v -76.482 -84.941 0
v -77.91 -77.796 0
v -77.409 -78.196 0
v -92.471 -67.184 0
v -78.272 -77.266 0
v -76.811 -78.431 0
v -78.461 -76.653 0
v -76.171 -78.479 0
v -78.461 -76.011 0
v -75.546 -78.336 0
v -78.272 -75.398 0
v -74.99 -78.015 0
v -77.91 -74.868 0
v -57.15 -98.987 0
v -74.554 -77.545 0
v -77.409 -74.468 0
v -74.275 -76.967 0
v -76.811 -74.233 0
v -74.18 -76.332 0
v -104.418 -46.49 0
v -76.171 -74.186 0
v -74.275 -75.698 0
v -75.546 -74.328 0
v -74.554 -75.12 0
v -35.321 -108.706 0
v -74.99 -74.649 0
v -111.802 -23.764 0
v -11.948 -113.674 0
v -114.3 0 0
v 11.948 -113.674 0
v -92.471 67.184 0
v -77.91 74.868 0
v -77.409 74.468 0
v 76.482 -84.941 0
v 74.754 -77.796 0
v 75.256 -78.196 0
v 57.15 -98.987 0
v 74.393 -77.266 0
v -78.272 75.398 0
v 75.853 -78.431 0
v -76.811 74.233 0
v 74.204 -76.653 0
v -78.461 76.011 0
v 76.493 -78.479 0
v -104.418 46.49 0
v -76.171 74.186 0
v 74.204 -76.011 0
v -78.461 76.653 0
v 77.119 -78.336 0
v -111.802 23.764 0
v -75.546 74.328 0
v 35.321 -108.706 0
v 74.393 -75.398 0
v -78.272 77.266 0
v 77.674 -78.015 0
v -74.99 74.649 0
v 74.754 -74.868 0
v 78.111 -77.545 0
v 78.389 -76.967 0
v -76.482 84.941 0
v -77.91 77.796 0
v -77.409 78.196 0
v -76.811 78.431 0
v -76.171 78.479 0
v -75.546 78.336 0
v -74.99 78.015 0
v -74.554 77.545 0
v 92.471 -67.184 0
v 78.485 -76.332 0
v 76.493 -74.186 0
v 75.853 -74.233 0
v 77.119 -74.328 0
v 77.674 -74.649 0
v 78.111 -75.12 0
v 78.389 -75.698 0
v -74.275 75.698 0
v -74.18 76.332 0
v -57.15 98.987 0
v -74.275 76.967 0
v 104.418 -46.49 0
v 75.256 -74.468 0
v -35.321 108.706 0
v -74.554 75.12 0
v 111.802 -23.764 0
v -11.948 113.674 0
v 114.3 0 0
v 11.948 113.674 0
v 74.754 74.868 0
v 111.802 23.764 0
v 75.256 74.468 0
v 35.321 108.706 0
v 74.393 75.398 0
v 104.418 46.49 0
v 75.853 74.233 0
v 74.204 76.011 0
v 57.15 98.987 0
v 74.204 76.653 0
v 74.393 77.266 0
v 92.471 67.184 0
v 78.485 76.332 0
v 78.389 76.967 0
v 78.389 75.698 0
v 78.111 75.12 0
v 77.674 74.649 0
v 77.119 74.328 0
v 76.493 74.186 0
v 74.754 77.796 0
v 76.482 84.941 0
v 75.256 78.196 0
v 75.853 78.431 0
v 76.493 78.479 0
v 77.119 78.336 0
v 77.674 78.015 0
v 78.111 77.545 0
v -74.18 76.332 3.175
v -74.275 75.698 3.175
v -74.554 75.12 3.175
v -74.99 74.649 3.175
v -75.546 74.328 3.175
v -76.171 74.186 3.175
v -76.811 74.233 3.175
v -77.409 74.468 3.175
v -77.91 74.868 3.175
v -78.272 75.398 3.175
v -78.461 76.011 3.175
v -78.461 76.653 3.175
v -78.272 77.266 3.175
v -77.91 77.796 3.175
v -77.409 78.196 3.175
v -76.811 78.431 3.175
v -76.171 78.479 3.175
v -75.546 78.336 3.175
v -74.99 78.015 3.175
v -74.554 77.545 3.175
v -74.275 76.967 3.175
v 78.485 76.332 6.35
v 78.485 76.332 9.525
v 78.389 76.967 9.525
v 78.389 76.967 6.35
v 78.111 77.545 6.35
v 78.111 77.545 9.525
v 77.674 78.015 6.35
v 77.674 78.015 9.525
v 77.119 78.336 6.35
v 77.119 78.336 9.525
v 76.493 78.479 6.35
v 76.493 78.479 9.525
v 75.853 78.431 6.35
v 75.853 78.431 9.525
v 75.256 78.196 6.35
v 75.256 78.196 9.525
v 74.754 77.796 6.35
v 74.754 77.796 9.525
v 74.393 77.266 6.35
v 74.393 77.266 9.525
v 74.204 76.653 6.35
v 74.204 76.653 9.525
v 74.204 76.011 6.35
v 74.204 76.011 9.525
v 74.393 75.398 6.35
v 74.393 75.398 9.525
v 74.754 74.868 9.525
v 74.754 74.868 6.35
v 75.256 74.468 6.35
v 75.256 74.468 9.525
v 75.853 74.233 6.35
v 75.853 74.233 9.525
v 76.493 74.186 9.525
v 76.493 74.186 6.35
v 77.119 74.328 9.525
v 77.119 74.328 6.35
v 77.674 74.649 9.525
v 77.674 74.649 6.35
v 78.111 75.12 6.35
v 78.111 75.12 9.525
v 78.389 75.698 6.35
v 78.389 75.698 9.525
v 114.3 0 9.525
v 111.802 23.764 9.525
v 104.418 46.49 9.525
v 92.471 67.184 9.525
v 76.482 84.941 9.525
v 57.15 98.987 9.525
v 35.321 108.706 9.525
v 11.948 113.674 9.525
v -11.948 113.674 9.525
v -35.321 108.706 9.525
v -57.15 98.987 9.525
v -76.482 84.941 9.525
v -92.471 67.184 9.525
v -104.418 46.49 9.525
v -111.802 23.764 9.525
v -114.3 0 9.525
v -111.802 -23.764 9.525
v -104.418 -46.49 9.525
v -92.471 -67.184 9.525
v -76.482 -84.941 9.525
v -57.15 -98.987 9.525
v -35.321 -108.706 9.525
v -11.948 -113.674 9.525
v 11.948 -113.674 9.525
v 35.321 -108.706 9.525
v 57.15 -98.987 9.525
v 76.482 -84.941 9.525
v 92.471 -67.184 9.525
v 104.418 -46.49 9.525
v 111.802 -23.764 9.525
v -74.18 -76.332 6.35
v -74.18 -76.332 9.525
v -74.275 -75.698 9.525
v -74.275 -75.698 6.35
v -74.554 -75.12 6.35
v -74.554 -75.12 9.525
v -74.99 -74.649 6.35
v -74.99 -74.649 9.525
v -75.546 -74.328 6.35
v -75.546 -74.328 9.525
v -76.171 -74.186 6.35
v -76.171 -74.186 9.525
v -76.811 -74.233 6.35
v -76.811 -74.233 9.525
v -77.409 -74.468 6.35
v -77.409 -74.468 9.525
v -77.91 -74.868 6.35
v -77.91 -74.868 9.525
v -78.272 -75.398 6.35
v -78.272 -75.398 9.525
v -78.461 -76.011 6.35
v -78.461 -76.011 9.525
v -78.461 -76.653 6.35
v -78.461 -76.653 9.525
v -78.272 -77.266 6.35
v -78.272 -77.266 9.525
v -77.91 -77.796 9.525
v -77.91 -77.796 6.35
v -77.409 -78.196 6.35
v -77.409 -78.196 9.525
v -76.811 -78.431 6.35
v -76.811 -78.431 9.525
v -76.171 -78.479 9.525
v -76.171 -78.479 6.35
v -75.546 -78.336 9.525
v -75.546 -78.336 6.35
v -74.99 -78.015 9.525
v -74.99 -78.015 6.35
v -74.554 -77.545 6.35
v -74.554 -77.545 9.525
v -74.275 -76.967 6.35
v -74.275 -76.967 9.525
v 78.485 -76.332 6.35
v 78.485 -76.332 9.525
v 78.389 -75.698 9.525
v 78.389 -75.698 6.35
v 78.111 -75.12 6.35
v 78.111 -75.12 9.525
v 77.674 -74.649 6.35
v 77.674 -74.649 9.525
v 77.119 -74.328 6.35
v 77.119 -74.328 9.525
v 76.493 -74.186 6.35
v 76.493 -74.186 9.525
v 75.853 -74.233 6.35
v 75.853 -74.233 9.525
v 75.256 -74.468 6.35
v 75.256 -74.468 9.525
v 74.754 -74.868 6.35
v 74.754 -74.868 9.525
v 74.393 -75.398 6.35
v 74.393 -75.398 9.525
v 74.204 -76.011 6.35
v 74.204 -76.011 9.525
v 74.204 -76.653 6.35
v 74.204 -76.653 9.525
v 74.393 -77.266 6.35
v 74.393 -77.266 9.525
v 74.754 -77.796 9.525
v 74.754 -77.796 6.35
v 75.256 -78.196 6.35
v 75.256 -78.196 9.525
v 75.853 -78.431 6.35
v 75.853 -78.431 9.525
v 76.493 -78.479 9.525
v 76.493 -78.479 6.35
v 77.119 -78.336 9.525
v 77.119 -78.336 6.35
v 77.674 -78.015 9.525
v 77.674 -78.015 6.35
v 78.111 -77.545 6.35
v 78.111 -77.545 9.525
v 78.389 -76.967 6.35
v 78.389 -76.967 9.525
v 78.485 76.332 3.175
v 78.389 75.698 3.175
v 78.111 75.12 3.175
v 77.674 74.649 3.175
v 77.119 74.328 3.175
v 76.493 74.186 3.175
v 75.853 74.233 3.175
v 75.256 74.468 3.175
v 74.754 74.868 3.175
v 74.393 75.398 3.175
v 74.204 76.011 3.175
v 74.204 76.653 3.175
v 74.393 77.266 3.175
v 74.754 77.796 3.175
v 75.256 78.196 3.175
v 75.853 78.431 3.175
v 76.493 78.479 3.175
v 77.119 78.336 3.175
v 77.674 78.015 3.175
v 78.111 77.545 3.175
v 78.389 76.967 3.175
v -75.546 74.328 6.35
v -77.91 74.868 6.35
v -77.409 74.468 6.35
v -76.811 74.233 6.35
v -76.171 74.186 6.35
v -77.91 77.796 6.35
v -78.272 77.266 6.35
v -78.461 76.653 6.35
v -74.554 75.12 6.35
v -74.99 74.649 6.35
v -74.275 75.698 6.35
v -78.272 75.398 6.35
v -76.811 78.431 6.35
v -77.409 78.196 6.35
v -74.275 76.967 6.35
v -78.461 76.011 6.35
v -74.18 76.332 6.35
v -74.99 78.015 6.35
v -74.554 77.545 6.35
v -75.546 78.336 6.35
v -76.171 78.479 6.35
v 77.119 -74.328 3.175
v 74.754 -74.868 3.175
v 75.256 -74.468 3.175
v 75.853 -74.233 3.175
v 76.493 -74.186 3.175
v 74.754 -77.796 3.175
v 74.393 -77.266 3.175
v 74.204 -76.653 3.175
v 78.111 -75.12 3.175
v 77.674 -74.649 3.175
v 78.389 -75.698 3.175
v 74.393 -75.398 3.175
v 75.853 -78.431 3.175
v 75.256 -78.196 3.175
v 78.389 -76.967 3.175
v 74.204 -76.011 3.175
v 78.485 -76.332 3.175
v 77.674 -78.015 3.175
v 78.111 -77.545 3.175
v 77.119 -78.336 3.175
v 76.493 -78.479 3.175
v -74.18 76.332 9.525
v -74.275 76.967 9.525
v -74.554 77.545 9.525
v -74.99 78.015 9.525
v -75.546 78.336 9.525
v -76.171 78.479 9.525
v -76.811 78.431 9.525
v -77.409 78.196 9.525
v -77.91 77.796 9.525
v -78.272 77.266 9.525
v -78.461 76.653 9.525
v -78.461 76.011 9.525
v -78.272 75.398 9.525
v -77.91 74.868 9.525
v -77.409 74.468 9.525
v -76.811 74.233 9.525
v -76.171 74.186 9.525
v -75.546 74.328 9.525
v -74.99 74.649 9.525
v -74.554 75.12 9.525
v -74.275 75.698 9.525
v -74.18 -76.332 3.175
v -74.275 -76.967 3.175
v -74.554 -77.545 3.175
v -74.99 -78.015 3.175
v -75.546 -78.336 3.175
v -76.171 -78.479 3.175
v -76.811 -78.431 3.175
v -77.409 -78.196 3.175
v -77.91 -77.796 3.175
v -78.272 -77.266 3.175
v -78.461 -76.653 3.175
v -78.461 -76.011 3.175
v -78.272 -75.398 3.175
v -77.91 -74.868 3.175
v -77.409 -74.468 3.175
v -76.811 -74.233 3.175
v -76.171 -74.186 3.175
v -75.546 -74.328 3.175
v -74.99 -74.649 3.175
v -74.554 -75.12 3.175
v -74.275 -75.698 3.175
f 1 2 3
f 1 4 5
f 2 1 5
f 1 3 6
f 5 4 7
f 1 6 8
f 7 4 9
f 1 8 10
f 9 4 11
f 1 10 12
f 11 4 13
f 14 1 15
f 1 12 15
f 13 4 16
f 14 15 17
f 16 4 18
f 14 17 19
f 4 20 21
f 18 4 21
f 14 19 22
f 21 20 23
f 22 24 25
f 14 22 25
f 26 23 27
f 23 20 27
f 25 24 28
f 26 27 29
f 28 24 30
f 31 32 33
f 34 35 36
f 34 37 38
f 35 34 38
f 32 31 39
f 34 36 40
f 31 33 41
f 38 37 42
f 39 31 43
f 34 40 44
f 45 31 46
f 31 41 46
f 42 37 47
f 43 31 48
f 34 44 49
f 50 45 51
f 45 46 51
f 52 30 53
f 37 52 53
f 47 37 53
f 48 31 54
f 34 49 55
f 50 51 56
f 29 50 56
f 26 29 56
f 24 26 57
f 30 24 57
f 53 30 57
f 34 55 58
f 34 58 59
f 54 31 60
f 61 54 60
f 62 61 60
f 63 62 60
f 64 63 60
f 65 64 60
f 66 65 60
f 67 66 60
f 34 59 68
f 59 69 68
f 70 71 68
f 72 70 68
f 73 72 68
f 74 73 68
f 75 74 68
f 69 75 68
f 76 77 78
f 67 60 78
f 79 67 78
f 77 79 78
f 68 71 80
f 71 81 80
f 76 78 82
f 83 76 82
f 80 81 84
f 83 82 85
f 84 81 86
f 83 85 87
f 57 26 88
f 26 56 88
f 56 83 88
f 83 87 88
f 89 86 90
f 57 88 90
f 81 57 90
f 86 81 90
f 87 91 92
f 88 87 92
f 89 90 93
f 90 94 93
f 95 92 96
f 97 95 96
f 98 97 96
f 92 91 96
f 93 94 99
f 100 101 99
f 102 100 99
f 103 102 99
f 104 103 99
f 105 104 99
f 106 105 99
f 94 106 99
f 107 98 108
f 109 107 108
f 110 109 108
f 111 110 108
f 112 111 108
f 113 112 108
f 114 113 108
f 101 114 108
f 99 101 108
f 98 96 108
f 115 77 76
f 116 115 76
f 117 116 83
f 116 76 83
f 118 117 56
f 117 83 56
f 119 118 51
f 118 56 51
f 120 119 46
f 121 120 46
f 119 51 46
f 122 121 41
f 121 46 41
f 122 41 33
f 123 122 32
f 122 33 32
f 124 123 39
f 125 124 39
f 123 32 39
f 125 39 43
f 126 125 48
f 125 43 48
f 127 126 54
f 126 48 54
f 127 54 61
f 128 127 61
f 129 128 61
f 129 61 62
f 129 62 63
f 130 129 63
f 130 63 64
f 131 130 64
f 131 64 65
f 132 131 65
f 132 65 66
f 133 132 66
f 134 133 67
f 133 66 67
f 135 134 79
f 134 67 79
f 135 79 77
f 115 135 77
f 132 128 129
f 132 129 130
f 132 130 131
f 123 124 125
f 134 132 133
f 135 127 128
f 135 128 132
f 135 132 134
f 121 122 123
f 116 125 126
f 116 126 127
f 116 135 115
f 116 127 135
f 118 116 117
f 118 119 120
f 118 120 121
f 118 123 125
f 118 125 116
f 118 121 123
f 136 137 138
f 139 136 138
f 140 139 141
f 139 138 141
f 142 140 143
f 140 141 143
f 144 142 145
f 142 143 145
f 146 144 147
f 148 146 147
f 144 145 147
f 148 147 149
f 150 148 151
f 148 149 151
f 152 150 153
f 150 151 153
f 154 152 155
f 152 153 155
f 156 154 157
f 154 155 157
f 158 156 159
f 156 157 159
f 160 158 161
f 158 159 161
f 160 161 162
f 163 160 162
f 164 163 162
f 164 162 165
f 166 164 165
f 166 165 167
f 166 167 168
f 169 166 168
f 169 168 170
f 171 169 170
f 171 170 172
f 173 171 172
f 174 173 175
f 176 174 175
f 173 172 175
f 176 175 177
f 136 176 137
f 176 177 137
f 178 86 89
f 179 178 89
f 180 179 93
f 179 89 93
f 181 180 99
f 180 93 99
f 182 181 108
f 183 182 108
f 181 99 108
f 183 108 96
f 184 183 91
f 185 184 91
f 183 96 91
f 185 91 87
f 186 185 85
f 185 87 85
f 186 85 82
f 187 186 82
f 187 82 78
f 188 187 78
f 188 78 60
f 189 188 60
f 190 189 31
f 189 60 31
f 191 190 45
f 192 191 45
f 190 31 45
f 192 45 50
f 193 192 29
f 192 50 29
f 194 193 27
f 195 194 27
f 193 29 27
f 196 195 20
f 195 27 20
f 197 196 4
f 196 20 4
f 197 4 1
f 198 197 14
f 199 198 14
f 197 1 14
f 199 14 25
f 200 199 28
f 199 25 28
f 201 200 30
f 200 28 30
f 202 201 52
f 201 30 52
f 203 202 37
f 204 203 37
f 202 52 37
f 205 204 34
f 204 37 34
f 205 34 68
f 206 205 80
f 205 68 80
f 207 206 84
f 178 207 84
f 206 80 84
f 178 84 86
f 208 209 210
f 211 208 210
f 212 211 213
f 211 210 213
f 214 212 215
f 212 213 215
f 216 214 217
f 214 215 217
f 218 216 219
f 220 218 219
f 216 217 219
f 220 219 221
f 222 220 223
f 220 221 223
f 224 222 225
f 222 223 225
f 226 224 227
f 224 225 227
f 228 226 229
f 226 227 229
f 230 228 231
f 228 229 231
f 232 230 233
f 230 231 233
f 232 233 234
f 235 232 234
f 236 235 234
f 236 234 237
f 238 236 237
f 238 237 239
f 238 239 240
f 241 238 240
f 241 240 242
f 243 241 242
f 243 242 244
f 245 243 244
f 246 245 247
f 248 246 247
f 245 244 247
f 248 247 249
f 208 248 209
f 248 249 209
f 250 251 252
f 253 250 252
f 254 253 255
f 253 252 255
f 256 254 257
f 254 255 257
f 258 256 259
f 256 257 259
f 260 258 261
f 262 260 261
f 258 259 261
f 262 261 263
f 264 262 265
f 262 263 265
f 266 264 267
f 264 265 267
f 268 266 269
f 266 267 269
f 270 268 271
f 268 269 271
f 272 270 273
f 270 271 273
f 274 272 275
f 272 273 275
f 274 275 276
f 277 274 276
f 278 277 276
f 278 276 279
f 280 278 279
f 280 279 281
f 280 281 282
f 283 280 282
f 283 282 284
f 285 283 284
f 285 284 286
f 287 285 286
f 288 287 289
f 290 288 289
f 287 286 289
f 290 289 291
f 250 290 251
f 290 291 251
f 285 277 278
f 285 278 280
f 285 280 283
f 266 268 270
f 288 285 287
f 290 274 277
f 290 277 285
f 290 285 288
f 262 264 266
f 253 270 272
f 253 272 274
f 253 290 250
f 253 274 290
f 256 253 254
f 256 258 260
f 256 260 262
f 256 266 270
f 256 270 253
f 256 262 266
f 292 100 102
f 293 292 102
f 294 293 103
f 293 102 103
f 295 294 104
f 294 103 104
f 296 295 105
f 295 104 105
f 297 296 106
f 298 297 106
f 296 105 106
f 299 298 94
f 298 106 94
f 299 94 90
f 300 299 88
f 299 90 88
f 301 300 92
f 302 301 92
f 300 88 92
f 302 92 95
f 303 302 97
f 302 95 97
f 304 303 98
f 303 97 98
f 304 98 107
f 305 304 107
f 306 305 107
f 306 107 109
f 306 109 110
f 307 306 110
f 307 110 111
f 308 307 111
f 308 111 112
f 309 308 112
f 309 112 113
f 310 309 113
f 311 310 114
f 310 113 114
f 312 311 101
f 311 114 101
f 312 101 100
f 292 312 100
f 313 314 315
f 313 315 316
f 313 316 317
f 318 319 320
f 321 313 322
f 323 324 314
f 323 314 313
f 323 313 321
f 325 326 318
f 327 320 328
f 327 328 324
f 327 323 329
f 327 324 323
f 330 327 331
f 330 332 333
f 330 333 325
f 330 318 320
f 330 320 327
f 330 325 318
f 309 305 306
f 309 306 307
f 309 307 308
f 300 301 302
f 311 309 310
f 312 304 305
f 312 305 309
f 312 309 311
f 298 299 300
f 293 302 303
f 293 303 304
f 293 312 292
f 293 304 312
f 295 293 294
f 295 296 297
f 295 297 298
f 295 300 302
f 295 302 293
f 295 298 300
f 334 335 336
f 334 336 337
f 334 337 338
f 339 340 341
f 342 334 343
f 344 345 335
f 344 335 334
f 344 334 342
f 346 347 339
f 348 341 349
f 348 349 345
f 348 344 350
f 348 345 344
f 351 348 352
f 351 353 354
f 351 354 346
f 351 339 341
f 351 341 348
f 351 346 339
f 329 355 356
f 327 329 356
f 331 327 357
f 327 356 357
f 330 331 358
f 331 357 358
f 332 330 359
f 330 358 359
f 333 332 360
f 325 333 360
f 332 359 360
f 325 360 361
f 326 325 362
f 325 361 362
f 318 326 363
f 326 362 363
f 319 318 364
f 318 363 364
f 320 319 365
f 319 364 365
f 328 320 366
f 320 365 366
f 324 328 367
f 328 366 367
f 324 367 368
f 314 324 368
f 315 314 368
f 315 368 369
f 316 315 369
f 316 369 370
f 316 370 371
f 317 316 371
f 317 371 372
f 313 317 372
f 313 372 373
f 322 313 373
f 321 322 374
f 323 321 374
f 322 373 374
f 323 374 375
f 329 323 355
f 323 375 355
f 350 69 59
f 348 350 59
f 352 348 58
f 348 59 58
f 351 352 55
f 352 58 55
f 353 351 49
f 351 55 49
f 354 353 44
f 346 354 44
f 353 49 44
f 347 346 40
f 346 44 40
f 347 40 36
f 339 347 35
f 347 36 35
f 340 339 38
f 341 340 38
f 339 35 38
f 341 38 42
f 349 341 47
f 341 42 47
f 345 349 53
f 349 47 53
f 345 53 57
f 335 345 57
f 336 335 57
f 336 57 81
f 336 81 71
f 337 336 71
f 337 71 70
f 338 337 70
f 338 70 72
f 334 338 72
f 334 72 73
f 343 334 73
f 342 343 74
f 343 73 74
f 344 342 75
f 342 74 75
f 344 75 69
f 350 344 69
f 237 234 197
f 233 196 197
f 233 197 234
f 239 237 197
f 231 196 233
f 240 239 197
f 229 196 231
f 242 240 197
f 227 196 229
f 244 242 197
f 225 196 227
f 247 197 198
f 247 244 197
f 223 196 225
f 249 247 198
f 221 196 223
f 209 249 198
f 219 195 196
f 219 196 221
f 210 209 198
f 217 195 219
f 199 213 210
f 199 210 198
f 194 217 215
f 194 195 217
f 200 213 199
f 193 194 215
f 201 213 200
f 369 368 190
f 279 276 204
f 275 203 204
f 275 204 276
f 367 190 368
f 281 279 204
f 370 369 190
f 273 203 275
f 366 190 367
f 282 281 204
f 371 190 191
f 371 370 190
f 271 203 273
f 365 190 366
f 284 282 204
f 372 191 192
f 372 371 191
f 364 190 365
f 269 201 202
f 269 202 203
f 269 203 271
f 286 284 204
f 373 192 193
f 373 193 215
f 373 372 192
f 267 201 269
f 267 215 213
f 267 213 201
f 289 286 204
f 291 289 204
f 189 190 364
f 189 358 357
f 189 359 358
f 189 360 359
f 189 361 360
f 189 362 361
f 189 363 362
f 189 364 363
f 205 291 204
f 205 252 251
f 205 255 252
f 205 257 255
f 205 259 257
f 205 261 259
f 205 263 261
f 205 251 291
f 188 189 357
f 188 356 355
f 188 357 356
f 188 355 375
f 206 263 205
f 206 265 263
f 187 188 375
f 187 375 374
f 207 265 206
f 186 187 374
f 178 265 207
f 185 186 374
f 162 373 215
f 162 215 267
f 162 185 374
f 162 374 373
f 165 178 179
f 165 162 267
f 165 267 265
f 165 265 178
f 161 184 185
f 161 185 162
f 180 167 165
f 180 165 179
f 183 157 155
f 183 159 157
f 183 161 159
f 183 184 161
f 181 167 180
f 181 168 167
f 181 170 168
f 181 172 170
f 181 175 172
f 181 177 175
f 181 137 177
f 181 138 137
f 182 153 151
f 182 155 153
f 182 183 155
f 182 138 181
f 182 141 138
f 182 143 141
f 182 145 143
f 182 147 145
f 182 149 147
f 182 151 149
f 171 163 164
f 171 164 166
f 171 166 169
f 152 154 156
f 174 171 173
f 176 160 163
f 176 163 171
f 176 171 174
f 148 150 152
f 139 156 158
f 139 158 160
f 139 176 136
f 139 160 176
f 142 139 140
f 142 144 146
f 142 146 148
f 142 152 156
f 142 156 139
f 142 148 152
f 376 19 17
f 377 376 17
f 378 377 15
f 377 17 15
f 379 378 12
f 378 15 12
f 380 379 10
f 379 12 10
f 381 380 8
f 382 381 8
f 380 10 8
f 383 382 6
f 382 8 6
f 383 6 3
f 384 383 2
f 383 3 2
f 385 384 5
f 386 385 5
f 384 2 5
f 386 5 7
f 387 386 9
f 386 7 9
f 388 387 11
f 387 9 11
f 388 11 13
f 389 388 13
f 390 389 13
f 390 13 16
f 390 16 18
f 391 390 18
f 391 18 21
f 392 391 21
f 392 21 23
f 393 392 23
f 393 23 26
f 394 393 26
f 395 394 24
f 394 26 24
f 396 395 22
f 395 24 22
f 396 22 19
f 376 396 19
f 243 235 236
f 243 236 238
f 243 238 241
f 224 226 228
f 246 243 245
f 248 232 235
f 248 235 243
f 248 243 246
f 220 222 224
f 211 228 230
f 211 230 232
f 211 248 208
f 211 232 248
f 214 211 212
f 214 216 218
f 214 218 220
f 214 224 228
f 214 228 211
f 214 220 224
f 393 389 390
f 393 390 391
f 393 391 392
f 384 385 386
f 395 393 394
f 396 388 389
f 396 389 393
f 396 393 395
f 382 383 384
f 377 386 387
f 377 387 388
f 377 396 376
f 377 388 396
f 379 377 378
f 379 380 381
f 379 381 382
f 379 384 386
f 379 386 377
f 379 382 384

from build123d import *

# Parameters (mm, degrees)
F0_R     = 114.3
F1_DEPTH = 9.525
F2_R     = 2.15265
F3_DEPTH = 3.175
F4_R     = 2.15265
F5_DEPTH = 3.175


with BuildPart() as f1:
    # F0 (on Top) → F1 (new body)
    with BuildSketch(Plane.XY):
        Circle(F0_R)
    extrude(amount=F1_DEPTH)

    # F2 (on face) → F3 (cut)
    with BuildSketch(Plane.XY.offset(9.525)):
        with Locations((-76.332177, 76.332177)):
            Circle(F2_R)
        with Locations((76.332177, 76.332177)):
            Circle(F2_R)
        with Locations((76.332177, -76.332177)):
            Circle(F2_R)
        with Locations((-76.332177, -76.332177)):
            Circle(F2_R)
    extrude(amount=-F3_DEPTH, mode=Mode.SUBTRACT)

    # F4 (on face) → F5 (cut)
    with BuildSketch(Plane(origin=(0, 0, 0), x_dir=(1, 0, 0), z_dir=(0, 0, -1))):
        with Locations((-76.332177, 76.332177)):
            Circle(F4_R)
        with Locations((76.332177, 76.332177)):
            Circle(F4_R)
        with Locations((76.332177, -76.332177)):
            Circle(F4_R)
        with Locations((-76.332177, -76.332177)):
            Circle(F4_R)
    extrude(amount=-F5_DEPTH, mode=Mode.SUBTRACT)


solid = f1.part
